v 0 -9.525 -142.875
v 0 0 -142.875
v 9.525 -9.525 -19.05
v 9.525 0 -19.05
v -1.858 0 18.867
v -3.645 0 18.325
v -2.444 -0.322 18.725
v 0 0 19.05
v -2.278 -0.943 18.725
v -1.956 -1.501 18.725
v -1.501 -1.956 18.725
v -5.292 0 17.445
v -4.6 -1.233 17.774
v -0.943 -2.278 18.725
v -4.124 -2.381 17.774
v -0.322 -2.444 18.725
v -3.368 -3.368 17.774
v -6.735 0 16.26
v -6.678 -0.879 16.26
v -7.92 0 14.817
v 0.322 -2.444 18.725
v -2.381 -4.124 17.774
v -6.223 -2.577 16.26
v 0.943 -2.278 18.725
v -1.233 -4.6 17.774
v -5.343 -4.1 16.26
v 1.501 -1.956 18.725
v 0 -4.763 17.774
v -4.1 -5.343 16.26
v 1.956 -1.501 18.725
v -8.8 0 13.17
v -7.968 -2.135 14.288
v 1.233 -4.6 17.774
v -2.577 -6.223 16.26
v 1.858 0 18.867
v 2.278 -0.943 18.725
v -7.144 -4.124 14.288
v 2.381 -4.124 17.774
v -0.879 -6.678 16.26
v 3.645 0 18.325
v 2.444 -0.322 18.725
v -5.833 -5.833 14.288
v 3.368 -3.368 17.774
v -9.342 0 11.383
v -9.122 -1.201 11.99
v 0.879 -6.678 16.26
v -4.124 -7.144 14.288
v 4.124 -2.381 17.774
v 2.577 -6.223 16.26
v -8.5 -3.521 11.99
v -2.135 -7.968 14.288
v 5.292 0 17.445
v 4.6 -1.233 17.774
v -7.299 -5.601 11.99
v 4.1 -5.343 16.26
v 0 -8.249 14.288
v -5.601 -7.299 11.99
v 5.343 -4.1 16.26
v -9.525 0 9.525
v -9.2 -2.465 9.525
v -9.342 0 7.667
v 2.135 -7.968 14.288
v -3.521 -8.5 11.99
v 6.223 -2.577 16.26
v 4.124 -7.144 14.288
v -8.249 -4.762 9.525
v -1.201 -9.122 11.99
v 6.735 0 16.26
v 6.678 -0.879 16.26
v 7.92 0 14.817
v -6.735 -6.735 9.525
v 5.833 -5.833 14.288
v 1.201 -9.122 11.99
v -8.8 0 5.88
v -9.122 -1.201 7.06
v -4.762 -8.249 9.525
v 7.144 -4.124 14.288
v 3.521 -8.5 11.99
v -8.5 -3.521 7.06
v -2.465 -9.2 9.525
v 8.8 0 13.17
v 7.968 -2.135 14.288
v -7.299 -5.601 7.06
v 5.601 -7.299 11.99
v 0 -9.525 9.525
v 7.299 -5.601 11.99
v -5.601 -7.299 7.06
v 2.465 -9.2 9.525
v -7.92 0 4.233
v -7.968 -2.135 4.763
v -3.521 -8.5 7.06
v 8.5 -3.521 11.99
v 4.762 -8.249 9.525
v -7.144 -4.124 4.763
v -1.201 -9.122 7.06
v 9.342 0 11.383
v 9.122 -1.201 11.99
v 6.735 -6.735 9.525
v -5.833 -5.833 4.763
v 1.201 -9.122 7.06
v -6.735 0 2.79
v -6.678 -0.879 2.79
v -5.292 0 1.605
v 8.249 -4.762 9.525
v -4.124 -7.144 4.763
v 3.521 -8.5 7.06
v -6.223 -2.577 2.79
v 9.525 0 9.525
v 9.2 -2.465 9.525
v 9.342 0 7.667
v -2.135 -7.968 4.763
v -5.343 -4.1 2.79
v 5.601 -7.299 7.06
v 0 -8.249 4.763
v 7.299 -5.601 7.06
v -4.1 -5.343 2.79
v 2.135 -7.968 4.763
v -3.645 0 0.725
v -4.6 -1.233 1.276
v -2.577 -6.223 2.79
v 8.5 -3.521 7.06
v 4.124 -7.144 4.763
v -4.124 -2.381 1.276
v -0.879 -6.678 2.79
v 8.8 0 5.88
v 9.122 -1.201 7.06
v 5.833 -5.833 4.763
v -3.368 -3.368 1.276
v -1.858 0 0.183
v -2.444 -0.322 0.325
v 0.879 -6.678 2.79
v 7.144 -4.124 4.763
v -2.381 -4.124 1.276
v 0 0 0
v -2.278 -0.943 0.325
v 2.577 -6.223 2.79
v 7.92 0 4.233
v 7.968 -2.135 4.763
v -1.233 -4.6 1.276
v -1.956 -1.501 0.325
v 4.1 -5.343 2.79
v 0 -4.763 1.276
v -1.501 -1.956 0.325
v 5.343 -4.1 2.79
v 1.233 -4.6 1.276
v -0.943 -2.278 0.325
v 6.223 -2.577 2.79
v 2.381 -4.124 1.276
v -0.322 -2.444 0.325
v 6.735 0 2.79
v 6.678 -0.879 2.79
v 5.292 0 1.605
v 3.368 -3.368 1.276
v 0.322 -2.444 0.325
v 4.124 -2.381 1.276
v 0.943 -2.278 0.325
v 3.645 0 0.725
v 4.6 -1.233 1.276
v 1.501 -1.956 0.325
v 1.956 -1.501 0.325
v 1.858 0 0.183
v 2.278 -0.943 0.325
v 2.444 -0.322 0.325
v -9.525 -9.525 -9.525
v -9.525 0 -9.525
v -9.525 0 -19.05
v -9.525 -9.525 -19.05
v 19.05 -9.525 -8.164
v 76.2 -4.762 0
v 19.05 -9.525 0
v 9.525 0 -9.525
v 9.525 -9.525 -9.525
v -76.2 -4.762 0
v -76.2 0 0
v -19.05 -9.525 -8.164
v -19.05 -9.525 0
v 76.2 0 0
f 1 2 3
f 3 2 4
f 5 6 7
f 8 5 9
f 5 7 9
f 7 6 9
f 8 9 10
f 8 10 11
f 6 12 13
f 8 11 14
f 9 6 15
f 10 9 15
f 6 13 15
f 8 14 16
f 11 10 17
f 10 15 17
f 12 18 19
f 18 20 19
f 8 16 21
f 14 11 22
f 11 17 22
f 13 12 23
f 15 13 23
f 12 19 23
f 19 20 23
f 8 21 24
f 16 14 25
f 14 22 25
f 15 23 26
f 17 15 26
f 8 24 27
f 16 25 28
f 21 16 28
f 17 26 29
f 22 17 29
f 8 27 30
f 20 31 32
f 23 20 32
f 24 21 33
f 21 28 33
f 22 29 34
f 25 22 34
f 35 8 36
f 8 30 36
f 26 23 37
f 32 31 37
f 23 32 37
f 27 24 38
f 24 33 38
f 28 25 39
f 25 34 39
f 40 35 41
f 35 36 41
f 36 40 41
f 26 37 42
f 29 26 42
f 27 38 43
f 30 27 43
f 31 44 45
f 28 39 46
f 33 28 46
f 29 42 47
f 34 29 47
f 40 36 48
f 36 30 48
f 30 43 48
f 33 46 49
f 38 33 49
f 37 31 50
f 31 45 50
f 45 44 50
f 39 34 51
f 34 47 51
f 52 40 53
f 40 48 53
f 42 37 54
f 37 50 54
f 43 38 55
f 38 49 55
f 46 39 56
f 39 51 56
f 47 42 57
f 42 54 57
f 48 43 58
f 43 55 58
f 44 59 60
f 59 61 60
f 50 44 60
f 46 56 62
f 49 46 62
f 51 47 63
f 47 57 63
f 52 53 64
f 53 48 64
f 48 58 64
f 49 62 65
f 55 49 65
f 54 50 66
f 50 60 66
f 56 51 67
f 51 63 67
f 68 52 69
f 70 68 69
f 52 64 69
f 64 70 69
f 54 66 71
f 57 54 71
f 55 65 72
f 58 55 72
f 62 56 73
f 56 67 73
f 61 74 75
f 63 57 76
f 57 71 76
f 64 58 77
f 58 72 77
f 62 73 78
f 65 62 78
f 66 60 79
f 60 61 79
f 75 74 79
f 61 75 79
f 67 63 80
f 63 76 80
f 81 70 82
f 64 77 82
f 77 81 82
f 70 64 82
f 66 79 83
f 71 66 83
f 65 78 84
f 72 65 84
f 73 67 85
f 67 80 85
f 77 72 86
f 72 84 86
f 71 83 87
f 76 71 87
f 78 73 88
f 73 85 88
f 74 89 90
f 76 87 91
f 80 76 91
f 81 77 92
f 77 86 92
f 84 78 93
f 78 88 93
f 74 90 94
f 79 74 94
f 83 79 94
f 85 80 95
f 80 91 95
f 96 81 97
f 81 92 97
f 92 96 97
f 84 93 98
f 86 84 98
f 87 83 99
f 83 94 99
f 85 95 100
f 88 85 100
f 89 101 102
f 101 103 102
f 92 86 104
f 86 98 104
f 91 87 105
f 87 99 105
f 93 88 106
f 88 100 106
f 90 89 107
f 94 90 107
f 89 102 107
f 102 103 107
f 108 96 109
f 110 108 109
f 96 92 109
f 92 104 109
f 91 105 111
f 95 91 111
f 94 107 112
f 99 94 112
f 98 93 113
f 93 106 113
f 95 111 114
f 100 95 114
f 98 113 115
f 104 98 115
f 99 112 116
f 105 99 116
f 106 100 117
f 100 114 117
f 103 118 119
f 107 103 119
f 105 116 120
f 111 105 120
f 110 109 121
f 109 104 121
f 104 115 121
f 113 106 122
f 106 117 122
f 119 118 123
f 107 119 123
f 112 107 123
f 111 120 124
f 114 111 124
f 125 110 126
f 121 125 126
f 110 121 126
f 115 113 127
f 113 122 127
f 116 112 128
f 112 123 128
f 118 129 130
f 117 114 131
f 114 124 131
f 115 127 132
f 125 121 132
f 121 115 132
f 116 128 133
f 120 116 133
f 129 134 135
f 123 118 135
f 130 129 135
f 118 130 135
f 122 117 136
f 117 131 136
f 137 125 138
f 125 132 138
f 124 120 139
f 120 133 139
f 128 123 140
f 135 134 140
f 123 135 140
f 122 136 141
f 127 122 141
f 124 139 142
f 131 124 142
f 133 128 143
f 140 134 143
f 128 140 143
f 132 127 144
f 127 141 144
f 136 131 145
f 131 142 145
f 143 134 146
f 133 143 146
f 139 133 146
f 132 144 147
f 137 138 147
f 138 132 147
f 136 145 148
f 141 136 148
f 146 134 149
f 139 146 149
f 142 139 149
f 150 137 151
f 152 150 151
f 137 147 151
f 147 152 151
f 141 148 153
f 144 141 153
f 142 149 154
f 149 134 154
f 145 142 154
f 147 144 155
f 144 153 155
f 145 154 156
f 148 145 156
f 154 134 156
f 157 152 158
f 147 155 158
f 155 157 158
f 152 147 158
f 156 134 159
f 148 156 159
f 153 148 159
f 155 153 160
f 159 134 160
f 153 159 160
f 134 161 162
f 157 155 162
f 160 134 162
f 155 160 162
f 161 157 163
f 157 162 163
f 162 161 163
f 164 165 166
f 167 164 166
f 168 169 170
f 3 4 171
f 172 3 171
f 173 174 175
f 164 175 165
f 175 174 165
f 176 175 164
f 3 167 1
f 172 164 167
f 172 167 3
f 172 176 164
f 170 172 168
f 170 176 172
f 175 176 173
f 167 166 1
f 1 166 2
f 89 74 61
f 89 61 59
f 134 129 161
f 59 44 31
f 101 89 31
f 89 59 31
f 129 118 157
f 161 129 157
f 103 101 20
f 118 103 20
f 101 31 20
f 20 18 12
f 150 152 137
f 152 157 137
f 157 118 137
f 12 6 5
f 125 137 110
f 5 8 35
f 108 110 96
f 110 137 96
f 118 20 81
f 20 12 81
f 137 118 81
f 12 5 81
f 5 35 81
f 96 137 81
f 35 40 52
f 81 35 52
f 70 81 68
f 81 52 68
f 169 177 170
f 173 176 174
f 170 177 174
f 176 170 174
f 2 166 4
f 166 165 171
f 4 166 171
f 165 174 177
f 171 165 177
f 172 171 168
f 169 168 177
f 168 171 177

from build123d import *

# Parameters (mm, degrees)
F1_DEPTH = 9.525
F2_ANGLE = -180
F4_DEPTH = 142.876


with BuildPart() as f1:
    # F0 (on Front) → F1 (new body)
    with BuildSketch(Plane.XZ):
        Polygon((-9.525, -9.525), (-9.525, -19.05), (0, -19.05), (9.525, -19.05), (9.525, -9.525), (9.525, 0), (0, 0), (-9.525, 0), align=None)
        Polygon((-76.2, 0), (-9.525, -9.525), (-9.525, 0), align=None)
        Polygon((9.525, 0), (9.525, -9.525), (76.2, 0), align=None)
        Polygon((0, -19.05), (-9.525, -19.05), (0, -142.875), align=None)
        Polygon((9.525, -19.05), (0, -19.05), (0, -142.875), align=None)
    extrude(amount=F1_DEPTH)

    # F3 (on face) → F4 (cut, through all)
    with BuildSketch(Plane.XY):
        Polygon((-76.2, -4.7625), (-76.2, -9.525), (-19.05, -9.525), align=None)
        Polygon((76.2, -4.7625), (19.05, -9.525), (76.2, -9.525), align=None)
    extrude(amount=-F4_DEPTH, mode=Mode.SUBTRACT)


with BuildPart() as f2:
    # F0 (on Front) → F2 (revolve)
    with BuildSketch(Plane.XZ):
        with BuildLine():
            ThreePointArc((0, 19.05), (-9.525, 9.525), (0, 0))
            Line((0, 0), (0, 19.05))
        make_face()
    revolve(axis=Axis((0, 0, -17.554175), (0, 0, -1)), revolution_arc=F2_ANGLE)


solid = Compound([f1.part, f2.part])
